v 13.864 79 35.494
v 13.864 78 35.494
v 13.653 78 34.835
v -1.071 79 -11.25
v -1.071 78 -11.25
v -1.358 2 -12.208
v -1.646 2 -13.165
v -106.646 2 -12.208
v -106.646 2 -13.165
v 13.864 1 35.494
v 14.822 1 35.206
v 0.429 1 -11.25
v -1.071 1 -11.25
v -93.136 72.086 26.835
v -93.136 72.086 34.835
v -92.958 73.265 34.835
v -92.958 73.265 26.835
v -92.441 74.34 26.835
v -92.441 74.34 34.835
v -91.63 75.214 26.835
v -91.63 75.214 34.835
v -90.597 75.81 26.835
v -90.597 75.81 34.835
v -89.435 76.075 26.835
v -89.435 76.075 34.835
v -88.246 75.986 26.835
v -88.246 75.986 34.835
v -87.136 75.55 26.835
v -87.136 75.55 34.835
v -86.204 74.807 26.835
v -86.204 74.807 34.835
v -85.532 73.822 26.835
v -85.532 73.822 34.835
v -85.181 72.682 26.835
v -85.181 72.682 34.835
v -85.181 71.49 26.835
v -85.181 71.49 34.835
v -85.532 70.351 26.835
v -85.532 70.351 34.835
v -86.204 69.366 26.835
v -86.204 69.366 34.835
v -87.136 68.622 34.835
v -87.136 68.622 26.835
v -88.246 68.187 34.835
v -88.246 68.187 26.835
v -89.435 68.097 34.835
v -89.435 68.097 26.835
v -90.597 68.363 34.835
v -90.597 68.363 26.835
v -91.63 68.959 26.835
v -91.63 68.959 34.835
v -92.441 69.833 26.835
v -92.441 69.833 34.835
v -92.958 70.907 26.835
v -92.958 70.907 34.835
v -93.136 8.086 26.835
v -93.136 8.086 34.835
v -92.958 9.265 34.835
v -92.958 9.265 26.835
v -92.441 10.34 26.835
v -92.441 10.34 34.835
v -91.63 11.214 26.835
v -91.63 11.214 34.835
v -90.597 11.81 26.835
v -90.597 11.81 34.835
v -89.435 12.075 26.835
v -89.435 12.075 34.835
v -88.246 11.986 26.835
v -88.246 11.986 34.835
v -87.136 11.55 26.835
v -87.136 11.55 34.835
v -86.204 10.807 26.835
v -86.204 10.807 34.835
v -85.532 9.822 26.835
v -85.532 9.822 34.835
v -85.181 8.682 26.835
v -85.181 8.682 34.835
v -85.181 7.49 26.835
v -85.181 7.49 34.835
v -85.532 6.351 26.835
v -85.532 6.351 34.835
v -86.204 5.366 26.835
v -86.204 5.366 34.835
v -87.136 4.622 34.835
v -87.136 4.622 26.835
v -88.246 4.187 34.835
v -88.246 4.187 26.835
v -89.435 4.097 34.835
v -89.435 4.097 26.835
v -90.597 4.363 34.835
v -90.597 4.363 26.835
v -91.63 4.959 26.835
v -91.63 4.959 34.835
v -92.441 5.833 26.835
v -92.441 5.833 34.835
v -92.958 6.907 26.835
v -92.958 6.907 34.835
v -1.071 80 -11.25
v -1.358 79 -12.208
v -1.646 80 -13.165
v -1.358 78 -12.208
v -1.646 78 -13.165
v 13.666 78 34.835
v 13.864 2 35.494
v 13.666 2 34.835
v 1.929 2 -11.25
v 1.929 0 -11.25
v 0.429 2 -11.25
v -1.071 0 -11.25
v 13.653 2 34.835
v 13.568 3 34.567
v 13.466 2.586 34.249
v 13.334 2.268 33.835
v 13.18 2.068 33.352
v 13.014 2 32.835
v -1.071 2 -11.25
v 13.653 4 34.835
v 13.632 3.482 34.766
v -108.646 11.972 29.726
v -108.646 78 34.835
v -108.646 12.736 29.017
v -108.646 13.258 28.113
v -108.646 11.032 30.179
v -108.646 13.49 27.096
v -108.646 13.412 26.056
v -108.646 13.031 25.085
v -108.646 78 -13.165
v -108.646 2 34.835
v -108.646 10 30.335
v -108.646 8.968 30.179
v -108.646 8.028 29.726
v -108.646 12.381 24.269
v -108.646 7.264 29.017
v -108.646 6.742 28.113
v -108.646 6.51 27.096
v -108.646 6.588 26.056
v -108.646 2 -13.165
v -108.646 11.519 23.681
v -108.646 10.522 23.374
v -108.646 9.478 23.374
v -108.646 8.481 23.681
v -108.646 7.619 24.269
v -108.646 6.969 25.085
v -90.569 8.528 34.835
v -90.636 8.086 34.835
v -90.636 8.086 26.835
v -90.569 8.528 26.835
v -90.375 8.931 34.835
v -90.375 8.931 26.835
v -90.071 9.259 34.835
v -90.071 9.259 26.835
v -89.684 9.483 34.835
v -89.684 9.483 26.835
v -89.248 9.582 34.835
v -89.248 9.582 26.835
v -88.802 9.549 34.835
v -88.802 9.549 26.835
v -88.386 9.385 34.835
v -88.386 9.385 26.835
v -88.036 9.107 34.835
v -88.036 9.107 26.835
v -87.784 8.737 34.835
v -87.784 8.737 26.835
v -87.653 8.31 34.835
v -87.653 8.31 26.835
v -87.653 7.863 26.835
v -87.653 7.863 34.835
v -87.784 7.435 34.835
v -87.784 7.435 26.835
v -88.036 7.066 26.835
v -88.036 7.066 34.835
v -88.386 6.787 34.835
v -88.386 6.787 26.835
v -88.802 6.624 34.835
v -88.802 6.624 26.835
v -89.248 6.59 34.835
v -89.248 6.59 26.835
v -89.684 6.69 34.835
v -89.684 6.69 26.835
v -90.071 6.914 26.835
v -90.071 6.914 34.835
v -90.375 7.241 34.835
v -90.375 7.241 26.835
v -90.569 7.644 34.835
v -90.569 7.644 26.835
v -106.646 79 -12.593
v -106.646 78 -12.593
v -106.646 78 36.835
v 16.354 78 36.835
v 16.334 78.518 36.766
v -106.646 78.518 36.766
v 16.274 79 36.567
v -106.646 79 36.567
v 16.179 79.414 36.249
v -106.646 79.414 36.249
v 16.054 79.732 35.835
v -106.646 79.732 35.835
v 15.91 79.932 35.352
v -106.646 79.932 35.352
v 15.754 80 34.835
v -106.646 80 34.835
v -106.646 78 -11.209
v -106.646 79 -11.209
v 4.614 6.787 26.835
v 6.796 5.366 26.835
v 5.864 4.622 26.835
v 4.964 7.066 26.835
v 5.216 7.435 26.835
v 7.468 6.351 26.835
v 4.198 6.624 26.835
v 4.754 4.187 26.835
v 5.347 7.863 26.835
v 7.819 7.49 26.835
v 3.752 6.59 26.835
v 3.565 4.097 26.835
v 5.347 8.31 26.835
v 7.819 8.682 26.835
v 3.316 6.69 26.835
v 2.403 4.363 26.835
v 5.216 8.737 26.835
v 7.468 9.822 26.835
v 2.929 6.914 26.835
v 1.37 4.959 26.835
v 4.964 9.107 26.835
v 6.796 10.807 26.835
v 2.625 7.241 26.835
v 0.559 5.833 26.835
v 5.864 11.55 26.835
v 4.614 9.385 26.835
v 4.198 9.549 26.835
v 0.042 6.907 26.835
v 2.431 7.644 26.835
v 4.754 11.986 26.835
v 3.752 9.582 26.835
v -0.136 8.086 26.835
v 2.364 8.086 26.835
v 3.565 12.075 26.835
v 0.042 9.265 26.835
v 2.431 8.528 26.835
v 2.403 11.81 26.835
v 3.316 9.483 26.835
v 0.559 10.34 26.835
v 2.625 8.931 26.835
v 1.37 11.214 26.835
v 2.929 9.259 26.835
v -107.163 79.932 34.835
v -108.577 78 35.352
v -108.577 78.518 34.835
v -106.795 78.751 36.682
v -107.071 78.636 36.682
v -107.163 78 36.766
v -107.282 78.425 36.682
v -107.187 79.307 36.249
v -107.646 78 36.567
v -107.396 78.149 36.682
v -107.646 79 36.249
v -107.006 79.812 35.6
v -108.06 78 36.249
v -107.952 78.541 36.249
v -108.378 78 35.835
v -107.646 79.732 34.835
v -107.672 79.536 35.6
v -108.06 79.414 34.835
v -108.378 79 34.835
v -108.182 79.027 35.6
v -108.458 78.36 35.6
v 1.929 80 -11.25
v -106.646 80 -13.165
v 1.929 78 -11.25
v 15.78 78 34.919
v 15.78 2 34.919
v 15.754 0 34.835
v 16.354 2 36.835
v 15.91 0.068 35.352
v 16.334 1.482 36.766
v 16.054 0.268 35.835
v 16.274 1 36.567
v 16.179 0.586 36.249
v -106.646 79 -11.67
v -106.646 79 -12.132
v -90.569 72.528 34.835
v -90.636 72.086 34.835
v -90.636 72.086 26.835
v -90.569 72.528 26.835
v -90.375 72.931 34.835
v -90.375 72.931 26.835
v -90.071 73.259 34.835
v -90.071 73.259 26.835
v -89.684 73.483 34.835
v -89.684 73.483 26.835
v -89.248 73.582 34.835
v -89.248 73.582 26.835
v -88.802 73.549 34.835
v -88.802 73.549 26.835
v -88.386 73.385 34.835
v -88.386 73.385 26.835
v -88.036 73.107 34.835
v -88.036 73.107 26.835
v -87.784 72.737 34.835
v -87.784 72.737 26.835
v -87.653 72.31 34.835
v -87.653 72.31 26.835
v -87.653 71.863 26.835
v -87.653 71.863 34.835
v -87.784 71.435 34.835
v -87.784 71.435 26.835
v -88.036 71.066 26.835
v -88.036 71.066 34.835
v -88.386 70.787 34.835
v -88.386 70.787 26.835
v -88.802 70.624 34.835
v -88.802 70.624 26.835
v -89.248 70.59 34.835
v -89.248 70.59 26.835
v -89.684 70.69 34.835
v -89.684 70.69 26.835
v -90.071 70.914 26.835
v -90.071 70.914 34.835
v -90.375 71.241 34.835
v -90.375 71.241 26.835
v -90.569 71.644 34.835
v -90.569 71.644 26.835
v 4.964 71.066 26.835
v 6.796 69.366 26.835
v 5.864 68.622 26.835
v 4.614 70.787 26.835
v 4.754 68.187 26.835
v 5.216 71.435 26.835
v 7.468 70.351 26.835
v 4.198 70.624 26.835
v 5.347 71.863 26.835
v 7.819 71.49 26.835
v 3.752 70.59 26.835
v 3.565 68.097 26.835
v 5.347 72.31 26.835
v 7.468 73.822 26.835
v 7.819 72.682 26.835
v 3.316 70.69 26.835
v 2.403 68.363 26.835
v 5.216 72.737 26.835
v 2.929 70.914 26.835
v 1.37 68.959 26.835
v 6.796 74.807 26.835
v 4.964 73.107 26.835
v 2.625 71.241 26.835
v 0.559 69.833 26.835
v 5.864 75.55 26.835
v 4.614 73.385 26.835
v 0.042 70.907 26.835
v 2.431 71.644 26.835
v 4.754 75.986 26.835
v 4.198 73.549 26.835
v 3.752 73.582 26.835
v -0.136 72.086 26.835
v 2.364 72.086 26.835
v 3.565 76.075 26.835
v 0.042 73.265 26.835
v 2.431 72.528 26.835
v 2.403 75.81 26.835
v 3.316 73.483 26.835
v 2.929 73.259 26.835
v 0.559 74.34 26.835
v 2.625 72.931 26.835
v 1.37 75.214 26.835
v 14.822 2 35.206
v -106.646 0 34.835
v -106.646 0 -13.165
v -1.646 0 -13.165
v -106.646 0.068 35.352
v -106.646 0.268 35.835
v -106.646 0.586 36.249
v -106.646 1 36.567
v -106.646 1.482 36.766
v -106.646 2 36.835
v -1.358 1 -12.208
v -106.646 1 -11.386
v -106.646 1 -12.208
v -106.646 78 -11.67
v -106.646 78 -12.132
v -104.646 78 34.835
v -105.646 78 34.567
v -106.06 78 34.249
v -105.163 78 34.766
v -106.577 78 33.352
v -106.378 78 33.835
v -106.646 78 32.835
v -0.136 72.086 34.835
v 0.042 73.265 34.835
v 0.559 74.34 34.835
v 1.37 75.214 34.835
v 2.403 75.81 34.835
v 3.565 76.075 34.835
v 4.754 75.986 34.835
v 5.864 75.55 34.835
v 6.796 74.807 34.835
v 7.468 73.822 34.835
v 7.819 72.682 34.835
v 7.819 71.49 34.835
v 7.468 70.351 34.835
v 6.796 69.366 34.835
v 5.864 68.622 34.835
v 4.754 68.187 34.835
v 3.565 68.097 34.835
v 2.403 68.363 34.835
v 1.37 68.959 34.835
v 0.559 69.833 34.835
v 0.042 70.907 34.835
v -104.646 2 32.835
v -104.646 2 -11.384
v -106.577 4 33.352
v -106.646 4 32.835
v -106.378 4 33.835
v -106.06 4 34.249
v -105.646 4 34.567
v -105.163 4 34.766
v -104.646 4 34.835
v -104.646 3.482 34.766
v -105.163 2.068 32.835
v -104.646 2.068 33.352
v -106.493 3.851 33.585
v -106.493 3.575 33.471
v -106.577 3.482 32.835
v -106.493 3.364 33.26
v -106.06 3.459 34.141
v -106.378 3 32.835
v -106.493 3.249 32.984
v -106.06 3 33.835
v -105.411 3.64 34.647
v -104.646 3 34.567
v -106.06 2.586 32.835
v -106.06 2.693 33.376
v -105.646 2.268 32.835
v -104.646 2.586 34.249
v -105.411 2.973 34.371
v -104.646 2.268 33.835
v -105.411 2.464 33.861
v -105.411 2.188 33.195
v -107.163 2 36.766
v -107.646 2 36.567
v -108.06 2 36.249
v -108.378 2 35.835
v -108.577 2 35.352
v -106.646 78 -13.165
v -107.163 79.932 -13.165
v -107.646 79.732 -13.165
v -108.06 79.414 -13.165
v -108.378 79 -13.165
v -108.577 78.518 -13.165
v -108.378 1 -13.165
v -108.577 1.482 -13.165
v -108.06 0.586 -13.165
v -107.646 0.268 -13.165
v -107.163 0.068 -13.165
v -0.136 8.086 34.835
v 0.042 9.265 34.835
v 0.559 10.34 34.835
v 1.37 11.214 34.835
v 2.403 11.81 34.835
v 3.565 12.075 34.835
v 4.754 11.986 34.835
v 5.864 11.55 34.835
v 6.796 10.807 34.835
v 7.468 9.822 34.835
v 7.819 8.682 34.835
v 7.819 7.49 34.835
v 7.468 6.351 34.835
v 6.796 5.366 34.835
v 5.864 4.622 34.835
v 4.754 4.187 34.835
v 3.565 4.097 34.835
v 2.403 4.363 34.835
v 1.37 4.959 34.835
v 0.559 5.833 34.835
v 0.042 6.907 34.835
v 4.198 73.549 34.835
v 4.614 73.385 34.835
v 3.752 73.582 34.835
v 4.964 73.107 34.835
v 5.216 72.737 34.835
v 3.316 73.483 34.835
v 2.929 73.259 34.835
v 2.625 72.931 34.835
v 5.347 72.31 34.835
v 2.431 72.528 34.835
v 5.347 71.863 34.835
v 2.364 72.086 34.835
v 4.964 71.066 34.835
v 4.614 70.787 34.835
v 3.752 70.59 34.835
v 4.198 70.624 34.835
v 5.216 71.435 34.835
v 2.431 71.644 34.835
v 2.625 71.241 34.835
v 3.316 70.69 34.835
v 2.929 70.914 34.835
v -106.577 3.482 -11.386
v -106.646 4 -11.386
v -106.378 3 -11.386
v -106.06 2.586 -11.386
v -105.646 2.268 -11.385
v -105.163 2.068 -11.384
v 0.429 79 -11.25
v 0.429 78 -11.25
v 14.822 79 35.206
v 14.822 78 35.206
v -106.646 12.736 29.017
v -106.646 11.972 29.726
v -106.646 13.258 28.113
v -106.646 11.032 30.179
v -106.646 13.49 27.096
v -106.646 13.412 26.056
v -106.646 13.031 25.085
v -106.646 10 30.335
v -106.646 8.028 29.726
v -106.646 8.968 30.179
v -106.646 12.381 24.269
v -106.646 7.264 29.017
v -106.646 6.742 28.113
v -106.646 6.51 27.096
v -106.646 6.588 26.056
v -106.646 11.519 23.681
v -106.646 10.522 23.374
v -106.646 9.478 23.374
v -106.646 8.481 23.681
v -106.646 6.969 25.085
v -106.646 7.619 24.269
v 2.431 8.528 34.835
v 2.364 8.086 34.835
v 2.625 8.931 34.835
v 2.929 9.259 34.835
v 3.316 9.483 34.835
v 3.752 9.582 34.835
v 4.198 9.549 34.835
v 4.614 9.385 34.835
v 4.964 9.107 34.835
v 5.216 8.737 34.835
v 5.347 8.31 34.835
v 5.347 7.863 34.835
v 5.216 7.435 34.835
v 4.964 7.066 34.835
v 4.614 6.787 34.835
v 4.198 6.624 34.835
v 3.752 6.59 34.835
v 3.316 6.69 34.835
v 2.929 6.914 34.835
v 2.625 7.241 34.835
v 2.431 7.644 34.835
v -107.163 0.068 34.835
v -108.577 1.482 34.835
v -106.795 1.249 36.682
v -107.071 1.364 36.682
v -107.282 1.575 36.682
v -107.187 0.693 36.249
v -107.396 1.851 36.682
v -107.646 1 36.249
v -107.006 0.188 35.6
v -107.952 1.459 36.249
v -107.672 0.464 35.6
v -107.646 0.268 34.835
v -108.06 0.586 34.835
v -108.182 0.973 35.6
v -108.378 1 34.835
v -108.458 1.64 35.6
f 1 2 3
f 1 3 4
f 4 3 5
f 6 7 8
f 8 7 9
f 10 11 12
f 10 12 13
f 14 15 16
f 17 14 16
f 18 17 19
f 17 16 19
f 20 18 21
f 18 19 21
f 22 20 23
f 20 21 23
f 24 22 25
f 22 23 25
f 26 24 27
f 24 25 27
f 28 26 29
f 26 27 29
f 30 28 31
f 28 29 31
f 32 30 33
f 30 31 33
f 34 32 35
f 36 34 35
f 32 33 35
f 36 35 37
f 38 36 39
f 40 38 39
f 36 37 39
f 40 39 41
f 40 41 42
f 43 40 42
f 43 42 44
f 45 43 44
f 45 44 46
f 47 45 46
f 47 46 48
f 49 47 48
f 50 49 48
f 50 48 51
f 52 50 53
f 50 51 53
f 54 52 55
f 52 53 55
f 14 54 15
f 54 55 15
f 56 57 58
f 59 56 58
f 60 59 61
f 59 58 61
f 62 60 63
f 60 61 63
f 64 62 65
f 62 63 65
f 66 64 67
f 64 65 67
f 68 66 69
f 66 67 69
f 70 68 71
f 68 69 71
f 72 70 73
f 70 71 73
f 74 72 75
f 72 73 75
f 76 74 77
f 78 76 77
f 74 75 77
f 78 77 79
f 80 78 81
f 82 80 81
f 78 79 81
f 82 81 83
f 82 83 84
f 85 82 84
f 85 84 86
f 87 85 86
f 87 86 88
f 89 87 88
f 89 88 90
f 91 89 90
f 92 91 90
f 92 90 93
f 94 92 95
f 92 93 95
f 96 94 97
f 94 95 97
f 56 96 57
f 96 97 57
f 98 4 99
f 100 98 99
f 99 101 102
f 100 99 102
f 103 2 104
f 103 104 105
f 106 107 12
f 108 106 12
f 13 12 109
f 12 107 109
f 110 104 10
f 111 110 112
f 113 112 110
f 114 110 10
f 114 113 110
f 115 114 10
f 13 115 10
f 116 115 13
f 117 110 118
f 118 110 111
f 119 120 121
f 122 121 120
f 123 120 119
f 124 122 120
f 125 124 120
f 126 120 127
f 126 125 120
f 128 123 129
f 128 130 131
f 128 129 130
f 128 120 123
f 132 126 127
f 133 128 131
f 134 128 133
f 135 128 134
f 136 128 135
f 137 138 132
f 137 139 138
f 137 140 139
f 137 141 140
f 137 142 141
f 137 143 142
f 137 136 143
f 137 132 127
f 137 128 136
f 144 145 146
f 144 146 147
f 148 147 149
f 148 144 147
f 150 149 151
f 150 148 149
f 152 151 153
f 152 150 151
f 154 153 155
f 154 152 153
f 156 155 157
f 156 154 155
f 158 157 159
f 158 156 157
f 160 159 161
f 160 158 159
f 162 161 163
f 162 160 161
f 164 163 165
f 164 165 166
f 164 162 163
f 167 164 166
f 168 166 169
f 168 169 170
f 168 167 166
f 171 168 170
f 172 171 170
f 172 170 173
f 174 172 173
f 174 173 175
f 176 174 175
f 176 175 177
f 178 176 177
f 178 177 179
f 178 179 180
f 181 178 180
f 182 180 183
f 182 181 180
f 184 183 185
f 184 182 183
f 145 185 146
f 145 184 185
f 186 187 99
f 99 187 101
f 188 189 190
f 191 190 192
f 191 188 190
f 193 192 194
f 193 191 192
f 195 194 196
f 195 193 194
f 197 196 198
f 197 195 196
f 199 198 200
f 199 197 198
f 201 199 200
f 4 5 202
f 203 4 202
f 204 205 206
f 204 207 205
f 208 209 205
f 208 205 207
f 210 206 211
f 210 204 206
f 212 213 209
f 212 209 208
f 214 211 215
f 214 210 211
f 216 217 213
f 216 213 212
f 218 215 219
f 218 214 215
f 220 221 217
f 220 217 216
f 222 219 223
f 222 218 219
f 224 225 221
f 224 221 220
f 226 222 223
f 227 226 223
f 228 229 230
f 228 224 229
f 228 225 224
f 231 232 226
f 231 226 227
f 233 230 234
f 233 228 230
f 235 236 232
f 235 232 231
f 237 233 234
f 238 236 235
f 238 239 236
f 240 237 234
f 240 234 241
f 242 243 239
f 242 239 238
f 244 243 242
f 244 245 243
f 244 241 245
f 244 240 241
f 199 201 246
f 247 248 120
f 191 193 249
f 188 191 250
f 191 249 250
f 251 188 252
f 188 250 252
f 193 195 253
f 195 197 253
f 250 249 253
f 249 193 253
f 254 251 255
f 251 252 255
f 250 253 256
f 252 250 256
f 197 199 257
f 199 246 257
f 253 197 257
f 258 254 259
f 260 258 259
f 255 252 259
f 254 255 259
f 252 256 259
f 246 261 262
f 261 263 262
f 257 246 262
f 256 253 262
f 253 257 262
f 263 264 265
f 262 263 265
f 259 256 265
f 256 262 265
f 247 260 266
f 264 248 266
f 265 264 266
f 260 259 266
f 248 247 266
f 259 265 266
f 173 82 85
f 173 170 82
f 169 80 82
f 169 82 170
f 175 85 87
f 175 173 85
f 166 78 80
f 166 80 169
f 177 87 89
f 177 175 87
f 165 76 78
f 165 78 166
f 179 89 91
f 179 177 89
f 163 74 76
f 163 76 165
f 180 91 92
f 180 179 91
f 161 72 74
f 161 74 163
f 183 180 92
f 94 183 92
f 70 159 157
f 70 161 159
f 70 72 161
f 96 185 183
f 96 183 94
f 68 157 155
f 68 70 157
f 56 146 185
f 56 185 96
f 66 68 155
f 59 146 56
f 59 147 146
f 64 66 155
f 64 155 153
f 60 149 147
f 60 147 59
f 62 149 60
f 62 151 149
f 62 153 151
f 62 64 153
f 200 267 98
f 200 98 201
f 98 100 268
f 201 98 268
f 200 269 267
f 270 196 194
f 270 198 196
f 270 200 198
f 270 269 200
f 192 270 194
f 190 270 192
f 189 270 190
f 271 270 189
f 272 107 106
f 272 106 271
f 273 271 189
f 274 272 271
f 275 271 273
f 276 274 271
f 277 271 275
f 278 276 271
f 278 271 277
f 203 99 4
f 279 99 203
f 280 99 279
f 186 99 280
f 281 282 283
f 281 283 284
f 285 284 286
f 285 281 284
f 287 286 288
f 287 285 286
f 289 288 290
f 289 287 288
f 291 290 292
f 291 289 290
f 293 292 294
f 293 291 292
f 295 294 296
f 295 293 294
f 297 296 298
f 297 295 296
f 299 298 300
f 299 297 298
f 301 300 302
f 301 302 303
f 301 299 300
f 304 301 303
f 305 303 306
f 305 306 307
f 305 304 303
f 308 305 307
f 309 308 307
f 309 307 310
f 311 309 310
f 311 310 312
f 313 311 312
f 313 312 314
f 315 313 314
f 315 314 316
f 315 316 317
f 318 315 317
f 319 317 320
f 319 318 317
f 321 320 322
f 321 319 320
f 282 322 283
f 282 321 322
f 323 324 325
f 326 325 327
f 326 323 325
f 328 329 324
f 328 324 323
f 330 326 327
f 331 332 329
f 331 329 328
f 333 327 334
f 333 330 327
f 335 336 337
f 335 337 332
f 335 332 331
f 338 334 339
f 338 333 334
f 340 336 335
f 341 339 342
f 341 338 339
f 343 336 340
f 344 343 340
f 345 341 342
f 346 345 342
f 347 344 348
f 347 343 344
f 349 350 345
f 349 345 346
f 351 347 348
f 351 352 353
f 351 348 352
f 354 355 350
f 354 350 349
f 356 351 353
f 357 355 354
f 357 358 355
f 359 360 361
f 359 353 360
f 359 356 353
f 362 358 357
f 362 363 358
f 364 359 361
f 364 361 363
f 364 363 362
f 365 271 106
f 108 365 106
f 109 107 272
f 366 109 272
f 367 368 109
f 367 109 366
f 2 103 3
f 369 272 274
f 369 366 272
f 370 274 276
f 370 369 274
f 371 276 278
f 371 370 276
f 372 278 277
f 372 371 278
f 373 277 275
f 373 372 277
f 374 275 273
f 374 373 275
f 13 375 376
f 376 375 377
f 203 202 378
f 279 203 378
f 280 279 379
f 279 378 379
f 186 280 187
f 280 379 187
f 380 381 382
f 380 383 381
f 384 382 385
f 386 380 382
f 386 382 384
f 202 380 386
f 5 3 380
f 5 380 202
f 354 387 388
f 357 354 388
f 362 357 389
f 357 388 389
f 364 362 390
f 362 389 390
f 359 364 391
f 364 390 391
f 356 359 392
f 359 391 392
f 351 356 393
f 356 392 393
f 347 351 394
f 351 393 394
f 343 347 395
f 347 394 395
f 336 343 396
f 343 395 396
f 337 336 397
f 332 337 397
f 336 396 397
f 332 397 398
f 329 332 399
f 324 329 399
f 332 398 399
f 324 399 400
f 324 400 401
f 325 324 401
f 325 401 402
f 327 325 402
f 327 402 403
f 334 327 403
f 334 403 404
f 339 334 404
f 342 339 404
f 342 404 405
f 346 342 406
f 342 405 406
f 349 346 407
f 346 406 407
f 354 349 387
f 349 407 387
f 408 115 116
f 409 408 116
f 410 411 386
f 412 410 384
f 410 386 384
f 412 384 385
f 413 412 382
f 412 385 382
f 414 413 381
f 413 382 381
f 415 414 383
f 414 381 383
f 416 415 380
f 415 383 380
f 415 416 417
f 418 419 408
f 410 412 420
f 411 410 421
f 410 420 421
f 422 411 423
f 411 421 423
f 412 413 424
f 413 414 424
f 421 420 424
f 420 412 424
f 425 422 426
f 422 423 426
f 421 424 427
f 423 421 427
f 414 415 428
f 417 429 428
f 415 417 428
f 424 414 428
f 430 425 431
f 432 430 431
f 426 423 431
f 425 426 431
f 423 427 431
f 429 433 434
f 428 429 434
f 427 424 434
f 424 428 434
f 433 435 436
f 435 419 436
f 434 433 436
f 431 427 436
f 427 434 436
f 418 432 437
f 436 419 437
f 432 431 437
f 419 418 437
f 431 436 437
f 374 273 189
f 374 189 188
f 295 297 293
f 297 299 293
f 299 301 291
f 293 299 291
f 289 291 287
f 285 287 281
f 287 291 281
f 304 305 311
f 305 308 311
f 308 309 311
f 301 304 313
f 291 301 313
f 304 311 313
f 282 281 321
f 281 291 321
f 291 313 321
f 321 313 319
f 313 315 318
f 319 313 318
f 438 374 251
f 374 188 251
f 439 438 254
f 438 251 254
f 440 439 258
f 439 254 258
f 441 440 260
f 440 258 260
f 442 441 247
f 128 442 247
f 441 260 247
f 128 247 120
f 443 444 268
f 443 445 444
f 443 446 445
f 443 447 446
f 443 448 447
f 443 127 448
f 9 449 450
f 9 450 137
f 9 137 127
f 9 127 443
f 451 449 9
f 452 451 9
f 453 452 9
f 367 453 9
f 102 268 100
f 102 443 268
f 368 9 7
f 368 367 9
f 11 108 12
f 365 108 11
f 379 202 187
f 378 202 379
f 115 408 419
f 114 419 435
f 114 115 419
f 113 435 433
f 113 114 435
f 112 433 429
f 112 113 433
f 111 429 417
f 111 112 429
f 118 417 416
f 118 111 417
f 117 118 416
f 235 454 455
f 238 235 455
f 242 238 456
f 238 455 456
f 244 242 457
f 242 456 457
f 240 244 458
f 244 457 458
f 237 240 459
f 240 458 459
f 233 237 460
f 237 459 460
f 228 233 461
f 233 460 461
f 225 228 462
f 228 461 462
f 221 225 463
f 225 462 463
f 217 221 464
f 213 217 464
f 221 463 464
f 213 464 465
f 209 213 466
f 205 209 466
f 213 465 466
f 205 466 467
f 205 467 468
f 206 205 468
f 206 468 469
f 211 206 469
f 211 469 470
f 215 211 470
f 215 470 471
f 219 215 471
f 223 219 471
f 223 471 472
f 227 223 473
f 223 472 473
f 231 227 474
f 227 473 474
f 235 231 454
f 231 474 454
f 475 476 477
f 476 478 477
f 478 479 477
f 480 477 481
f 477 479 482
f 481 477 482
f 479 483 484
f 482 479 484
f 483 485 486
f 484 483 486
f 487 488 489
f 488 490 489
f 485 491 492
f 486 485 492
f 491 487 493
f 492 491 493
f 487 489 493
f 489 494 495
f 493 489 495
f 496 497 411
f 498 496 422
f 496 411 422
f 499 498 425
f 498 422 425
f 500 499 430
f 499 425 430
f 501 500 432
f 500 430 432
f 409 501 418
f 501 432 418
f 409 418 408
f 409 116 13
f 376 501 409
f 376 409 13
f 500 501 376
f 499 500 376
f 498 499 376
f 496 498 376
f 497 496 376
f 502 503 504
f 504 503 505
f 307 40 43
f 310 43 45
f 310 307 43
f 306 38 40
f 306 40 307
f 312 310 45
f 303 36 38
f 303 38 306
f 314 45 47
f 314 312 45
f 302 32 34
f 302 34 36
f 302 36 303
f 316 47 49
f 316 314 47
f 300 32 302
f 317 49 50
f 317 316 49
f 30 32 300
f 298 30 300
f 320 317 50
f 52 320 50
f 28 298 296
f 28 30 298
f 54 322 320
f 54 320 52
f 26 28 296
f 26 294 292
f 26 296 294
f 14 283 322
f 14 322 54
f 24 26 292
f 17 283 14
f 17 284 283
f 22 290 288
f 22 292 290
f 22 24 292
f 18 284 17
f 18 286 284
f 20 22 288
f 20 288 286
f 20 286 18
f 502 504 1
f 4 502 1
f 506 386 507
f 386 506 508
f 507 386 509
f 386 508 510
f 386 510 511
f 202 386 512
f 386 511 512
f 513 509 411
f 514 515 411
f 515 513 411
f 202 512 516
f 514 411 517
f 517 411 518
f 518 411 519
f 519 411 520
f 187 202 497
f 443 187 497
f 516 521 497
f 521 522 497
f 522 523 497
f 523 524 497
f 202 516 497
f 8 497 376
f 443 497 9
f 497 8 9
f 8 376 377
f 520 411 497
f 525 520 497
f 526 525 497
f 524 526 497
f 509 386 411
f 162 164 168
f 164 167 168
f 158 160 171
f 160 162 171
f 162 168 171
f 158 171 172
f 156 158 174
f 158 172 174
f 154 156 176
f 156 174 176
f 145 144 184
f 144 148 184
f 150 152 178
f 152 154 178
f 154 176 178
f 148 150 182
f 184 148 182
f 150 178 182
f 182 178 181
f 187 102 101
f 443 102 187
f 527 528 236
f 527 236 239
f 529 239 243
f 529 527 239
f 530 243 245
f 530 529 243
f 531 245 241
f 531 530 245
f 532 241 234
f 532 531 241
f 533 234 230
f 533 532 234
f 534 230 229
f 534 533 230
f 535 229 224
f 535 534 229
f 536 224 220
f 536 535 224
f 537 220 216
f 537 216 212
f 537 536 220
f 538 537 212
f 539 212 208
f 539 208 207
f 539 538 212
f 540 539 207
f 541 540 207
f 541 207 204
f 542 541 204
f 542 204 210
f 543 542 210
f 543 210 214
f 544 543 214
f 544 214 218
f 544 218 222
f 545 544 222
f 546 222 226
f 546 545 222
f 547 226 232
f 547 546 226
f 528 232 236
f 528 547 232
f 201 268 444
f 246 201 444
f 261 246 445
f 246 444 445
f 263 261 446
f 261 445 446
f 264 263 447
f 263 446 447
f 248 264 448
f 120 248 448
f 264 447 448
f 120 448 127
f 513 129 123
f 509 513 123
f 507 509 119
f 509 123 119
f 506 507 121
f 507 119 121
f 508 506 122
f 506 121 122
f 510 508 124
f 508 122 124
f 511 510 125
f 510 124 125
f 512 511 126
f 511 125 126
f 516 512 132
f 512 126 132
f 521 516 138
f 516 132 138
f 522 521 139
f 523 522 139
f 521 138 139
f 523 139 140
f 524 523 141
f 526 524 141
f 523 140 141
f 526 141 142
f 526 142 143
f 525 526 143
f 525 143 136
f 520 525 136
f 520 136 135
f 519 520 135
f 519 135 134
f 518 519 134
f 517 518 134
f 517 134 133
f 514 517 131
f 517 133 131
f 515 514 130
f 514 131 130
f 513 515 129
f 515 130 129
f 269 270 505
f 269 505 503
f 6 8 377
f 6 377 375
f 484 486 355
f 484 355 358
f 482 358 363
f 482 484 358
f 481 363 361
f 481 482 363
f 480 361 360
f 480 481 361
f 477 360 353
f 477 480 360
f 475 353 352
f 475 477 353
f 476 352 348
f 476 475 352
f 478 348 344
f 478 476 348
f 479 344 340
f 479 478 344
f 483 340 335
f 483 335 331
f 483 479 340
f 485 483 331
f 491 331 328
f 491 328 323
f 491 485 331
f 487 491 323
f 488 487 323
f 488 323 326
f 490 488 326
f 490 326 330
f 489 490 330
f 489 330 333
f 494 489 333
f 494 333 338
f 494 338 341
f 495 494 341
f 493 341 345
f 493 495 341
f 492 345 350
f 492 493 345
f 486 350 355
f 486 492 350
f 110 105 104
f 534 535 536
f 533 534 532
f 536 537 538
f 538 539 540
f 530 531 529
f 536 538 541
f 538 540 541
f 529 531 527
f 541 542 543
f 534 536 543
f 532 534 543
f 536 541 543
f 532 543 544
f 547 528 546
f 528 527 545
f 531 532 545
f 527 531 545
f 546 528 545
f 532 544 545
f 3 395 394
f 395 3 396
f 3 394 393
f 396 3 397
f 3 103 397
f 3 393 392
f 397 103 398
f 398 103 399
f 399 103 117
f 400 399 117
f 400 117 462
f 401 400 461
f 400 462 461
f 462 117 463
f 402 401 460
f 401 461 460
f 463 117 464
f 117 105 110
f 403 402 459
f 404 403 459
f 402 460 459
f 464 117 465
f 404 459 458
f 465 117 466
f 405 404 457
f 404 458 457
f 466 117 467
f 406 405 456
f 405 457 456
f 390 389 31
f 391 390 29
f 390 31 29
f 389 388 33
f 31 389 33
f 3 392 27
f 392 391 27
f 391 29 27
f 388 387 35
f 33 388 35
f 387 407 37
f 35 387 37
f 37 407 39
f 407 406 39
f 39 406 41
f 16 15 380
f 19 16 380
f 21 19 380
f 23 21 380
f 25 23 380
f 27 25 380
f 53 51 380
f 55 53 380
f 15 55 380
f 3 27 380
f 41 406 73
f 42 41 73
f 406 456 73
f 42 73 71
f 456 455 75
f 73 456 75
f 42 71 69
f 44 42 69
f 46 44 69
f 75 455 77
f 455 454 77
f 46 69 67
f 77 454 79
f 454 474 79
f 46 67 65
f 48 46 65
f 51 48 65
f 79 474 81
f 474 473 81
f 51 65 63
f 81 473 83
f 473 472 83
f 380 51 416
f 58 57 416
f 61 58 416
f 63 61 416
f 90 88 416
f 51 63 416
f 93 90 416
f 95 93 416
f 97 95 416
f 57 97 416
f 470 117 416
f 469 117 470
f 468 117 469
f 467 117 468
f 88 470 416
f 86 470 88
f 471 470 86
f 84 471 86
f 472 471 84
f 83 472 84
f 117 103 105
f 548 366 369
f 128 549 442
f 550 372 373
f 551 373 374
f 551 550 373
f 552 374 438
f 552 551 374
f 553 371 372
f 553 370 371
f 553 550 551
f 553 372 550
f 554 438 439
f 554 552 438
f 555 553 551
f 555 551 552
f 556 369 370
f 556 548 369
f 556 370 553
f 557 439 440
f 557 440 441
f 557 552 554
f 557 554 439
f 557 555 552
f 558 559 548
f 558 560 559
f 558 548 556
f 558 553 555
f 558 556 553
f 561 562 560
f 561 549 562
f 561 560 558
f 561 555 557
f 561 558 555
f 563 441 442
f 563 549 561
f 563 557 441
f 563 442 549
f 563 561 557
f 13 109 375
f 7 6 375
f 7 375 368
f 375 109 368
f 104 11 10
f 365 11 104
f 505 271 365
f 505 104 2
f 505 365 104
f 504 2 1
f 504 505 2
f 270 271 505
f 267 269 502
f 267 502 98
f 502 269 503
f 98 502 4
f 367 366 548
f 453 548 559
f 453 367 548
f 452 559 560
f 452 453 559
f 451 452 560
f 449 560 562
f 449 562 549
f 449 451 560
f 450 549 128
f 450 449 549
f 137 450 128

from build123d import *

# Parameters (mm, degrees)
BOSS_EXTRUDE1_DEPTH = 80
SHELL1_T            = -2
CUT_EXTRUDE2_DEPTH  = 92
CUT_EXTRUDE3_DEPTH  = 1
CUT_EXTRUDE4_DEPTH  = 1
SKETCH11_W          = 48.201532545
SKETCH11_H          = 76
CUT_EXTRUDE6_DEPTH  = 2
SKETCH12_W          = 2.088061302
SKETCH12_H          = 76
CUT_EXTRUDE7_DEPTH  = 2
CUT_EXTRUDE9_DEPTH  = 1
CUT_EXTRUDE10_DEPTH = 1
SKETCH16_R          = 3.5
CUT_EXTRUDE11_DEPTH = 2
SKETCH17_R          = 4
SKETCH17_R_2        = 1.5
BOSS_EXTRUDE2_DEPTH = 8
FILLET1_R           = 2


with BuildPart() as part:
    # Sketch2 → Boss-Extrude1 (new body)
    with BuildSketch(Plane(origin=(0, 0, 0), x_dir=(1, 0, 0), z_dir=(0, 1, 0))):
        Polygon((-108.645583258, -36.834647189), (-108.645583258, 13.165352811), (1.354416742, 13.165352811), (16.354416742, -36.834647189), align=None)
    extrude(amount=BOSS_EXTRUDE1_DEPTH)

    # Shell1
    shell1_openings = [part.faces().sort_by_distance(p)[0] for p in [
        (-53.645583258, 40, -13.165352811),
    ]]
    offset(amount=SHELL1_T, openings=shell1_openings, kind=Kind.INTERSECTION)

    # Sketch6 → Cut-Extrude2 (cut)
    with BuildSketch(Plane(origin=(0, 0, 0), x_dir=(-1, 0, 0), z_dir=(0, -1, 0))):
        Polygon((-1.354416742, 13.165352811), (-1.929112513, 11.24970024), (1.070887487, 11.24970024), (1.645583258, 13.165352811), align=None)
    extrude(amount=-CUT_EXTRUDE2_DEPTH, mode=Mode.SUBTRACT)

    # Sketch7 → Cut-Extrude3 (cut)
    with BuildSketch(Plane(origin=(0, 2, 0), x_dir=(1, 0, 0), z_dir=(0, 1, 0))):
        Polygon((-1.070887487, 11.24970024), (-106.645583258, 11.386355729), (-106.645583258, 12.207526526), (-1.358235373, 12.207526526), align=None)
    extrude(amount=-CUT_EXTRUDE3_DEPTH, mode=Mode.SUBTRACT)

    # Sketch9 → Cut-Extrude4 (cut)
    with BuildSketch(Plane(origin=(0, 78, 0), x_dir=(-1, 0, 0), z_dir=(0, -1, 0))):
        with BuildLine():
            Line((1.070887487, 11.24970024), (106.645583258, 11.208974605))
            ThreePointArc((106.645583258, 11.208974605), (106.645716747, 11.901071267), (106.645583258, 12.593167929))
            Line((106.645583258, 12.593167929), (1.358235373, 12.207526526))
            Line((1.358235373, 12.207526526), (1.070887487, 11.24970024))
        make_face()
    extrude(amount=-CUT_EXTRUDE4_DEPTH, mode=Mode.SUBTRACT)

    # Sketch11 → Cut-Extrude6 (cut)
    with BuildSketch(Plane(origin=(4.866075766, 0, -1.45982273), x_dir=(-0.287347886, 0, -0.957826285), z_dir=(0.957826285, 0, -0.287347886))):
        with Locations((-13.879834083, 40)):
            Rectangle(SKETCH11_W, SKETCH11_H)
    extrude(amount=-CUT_EXTRUDE6_DEPTH, mode=Mode.SUBTRACT)

    # Sketch12 → Cut-Extrude7 (cut)
    with BuildSketch(Plane(origin=(0, 0, -11.24970024), x_dir=(-1, 0, 0), z_dir=(0, 0, -1))):
        with Locations((-0.885081862, 40)):
            Rectangle(SKETCH12_W, SKETCH12_H)
    extrude(amount=-CUT_EXTRUDE7_DEPTH, mode=Mode.SUBTRACT)

    # Sketch14 → Cut-Extrude9 (cut)
    with BuildSketch(Plane(origin=(0, 2, 0), x_dir=(1, 0, 0), z_dir=(0, 1, 0))):
        Polygon((-1.070887487, 11.24970024), (0.429112513, 11.24970024), (14.821894685, -35.206342504), (13.8640684, -35.49369039), align=None)
    extrude(amount=-CUT_EXTRUDE9_DEPTH, mode=Mode.SUBTRACT)

    # Sketch15 → Cut-Extrude10 (cut)
    with BuildSketch(Plane(origin=(0, 78, 0), x_dir=(-1, 0, 0), z_dir=(0, -1, 0))):
        Polygon((-13.8640684, -35.49369039), (1.070887487, 11.24970024), (-0.429112513, 11.24970024), (-14.821894685, -35.206342504), align=None)
    extrude(amount=-CUT_EXTRUDE10_DEPTH, mode=Mode.SUBTRACT)

    # Sketch16 → Cut-Extrude11 (cut)
    with BuildSketch(Plane.ZY.offset(108.645583258)):
        with Locations((26.834647189, 10)):
            Circle(SKETCH16_R)
    extrude(amount=-CUT_EXTRUDE11_DEPTH, mode=Mode.SUBTRACT)

    # Sketch17 → Boss-Extrude2 (add)
    with BuildSketch(Plane(origin=(0, 0, 34.834647189), x_dir=(-1, 0, 0), z_dir=(0, 0, -1))):
        with Locations((89.1359316, 72.086299327)):
            Circle(SKETCH17_R)
        with Locations((89.1359316, 72.086299327)):
            Circle(SKETCH17_R_2, mode=Mode.SUBTRACT)
        with Locations((-3.8640684, 72.086299327)):
            Circle(SKETCH17_R)
        with Locations((-3.8640684, 72.086299327)):
            Circle(SKETCH17_R_2, mode=Mode.SUBTRACT)
        with Locations((-3.8640684, 8.086299327)):
            Circle(SKETCH17_R)
        with Locations((-3.8640684, 8.086299327)):
            Circle(SKETCH17_R_2, mode=Mode.SUBTRACT)
        with Locations((89.1359316, 8.086299327)):
            Circle(SKETCH17_R)
        with Locations((89.1359316, 8.086299327)):
            Circle(SKETCH17_R_2, mode=Mode.SUBTRACT)
    extrude(amount=BOSS_EXTRUDE2_DEPTH)

    # Fillet1
    fillet1_edges = [part.edges().sort_by_distance(p)[0] for p in [
        (-46.496042701, 2, 34.834647189),
        (-106.645583258, 40, 34.834647189),
        (-108.645583258, 80, 11.834647189),
        (-46.145583258, 80, 36.834647189),
        (-108.645583258, 0, 11.834647189),
        (-106.645583258, 2, 11.72414573),
        (-46.145583258, 0, 36.834647189),
        (-108.645583258, 40, 36.834647189),
    ]]
    fillet(fillet1_edges, radius=FILLET1_R)


solid = part.part
